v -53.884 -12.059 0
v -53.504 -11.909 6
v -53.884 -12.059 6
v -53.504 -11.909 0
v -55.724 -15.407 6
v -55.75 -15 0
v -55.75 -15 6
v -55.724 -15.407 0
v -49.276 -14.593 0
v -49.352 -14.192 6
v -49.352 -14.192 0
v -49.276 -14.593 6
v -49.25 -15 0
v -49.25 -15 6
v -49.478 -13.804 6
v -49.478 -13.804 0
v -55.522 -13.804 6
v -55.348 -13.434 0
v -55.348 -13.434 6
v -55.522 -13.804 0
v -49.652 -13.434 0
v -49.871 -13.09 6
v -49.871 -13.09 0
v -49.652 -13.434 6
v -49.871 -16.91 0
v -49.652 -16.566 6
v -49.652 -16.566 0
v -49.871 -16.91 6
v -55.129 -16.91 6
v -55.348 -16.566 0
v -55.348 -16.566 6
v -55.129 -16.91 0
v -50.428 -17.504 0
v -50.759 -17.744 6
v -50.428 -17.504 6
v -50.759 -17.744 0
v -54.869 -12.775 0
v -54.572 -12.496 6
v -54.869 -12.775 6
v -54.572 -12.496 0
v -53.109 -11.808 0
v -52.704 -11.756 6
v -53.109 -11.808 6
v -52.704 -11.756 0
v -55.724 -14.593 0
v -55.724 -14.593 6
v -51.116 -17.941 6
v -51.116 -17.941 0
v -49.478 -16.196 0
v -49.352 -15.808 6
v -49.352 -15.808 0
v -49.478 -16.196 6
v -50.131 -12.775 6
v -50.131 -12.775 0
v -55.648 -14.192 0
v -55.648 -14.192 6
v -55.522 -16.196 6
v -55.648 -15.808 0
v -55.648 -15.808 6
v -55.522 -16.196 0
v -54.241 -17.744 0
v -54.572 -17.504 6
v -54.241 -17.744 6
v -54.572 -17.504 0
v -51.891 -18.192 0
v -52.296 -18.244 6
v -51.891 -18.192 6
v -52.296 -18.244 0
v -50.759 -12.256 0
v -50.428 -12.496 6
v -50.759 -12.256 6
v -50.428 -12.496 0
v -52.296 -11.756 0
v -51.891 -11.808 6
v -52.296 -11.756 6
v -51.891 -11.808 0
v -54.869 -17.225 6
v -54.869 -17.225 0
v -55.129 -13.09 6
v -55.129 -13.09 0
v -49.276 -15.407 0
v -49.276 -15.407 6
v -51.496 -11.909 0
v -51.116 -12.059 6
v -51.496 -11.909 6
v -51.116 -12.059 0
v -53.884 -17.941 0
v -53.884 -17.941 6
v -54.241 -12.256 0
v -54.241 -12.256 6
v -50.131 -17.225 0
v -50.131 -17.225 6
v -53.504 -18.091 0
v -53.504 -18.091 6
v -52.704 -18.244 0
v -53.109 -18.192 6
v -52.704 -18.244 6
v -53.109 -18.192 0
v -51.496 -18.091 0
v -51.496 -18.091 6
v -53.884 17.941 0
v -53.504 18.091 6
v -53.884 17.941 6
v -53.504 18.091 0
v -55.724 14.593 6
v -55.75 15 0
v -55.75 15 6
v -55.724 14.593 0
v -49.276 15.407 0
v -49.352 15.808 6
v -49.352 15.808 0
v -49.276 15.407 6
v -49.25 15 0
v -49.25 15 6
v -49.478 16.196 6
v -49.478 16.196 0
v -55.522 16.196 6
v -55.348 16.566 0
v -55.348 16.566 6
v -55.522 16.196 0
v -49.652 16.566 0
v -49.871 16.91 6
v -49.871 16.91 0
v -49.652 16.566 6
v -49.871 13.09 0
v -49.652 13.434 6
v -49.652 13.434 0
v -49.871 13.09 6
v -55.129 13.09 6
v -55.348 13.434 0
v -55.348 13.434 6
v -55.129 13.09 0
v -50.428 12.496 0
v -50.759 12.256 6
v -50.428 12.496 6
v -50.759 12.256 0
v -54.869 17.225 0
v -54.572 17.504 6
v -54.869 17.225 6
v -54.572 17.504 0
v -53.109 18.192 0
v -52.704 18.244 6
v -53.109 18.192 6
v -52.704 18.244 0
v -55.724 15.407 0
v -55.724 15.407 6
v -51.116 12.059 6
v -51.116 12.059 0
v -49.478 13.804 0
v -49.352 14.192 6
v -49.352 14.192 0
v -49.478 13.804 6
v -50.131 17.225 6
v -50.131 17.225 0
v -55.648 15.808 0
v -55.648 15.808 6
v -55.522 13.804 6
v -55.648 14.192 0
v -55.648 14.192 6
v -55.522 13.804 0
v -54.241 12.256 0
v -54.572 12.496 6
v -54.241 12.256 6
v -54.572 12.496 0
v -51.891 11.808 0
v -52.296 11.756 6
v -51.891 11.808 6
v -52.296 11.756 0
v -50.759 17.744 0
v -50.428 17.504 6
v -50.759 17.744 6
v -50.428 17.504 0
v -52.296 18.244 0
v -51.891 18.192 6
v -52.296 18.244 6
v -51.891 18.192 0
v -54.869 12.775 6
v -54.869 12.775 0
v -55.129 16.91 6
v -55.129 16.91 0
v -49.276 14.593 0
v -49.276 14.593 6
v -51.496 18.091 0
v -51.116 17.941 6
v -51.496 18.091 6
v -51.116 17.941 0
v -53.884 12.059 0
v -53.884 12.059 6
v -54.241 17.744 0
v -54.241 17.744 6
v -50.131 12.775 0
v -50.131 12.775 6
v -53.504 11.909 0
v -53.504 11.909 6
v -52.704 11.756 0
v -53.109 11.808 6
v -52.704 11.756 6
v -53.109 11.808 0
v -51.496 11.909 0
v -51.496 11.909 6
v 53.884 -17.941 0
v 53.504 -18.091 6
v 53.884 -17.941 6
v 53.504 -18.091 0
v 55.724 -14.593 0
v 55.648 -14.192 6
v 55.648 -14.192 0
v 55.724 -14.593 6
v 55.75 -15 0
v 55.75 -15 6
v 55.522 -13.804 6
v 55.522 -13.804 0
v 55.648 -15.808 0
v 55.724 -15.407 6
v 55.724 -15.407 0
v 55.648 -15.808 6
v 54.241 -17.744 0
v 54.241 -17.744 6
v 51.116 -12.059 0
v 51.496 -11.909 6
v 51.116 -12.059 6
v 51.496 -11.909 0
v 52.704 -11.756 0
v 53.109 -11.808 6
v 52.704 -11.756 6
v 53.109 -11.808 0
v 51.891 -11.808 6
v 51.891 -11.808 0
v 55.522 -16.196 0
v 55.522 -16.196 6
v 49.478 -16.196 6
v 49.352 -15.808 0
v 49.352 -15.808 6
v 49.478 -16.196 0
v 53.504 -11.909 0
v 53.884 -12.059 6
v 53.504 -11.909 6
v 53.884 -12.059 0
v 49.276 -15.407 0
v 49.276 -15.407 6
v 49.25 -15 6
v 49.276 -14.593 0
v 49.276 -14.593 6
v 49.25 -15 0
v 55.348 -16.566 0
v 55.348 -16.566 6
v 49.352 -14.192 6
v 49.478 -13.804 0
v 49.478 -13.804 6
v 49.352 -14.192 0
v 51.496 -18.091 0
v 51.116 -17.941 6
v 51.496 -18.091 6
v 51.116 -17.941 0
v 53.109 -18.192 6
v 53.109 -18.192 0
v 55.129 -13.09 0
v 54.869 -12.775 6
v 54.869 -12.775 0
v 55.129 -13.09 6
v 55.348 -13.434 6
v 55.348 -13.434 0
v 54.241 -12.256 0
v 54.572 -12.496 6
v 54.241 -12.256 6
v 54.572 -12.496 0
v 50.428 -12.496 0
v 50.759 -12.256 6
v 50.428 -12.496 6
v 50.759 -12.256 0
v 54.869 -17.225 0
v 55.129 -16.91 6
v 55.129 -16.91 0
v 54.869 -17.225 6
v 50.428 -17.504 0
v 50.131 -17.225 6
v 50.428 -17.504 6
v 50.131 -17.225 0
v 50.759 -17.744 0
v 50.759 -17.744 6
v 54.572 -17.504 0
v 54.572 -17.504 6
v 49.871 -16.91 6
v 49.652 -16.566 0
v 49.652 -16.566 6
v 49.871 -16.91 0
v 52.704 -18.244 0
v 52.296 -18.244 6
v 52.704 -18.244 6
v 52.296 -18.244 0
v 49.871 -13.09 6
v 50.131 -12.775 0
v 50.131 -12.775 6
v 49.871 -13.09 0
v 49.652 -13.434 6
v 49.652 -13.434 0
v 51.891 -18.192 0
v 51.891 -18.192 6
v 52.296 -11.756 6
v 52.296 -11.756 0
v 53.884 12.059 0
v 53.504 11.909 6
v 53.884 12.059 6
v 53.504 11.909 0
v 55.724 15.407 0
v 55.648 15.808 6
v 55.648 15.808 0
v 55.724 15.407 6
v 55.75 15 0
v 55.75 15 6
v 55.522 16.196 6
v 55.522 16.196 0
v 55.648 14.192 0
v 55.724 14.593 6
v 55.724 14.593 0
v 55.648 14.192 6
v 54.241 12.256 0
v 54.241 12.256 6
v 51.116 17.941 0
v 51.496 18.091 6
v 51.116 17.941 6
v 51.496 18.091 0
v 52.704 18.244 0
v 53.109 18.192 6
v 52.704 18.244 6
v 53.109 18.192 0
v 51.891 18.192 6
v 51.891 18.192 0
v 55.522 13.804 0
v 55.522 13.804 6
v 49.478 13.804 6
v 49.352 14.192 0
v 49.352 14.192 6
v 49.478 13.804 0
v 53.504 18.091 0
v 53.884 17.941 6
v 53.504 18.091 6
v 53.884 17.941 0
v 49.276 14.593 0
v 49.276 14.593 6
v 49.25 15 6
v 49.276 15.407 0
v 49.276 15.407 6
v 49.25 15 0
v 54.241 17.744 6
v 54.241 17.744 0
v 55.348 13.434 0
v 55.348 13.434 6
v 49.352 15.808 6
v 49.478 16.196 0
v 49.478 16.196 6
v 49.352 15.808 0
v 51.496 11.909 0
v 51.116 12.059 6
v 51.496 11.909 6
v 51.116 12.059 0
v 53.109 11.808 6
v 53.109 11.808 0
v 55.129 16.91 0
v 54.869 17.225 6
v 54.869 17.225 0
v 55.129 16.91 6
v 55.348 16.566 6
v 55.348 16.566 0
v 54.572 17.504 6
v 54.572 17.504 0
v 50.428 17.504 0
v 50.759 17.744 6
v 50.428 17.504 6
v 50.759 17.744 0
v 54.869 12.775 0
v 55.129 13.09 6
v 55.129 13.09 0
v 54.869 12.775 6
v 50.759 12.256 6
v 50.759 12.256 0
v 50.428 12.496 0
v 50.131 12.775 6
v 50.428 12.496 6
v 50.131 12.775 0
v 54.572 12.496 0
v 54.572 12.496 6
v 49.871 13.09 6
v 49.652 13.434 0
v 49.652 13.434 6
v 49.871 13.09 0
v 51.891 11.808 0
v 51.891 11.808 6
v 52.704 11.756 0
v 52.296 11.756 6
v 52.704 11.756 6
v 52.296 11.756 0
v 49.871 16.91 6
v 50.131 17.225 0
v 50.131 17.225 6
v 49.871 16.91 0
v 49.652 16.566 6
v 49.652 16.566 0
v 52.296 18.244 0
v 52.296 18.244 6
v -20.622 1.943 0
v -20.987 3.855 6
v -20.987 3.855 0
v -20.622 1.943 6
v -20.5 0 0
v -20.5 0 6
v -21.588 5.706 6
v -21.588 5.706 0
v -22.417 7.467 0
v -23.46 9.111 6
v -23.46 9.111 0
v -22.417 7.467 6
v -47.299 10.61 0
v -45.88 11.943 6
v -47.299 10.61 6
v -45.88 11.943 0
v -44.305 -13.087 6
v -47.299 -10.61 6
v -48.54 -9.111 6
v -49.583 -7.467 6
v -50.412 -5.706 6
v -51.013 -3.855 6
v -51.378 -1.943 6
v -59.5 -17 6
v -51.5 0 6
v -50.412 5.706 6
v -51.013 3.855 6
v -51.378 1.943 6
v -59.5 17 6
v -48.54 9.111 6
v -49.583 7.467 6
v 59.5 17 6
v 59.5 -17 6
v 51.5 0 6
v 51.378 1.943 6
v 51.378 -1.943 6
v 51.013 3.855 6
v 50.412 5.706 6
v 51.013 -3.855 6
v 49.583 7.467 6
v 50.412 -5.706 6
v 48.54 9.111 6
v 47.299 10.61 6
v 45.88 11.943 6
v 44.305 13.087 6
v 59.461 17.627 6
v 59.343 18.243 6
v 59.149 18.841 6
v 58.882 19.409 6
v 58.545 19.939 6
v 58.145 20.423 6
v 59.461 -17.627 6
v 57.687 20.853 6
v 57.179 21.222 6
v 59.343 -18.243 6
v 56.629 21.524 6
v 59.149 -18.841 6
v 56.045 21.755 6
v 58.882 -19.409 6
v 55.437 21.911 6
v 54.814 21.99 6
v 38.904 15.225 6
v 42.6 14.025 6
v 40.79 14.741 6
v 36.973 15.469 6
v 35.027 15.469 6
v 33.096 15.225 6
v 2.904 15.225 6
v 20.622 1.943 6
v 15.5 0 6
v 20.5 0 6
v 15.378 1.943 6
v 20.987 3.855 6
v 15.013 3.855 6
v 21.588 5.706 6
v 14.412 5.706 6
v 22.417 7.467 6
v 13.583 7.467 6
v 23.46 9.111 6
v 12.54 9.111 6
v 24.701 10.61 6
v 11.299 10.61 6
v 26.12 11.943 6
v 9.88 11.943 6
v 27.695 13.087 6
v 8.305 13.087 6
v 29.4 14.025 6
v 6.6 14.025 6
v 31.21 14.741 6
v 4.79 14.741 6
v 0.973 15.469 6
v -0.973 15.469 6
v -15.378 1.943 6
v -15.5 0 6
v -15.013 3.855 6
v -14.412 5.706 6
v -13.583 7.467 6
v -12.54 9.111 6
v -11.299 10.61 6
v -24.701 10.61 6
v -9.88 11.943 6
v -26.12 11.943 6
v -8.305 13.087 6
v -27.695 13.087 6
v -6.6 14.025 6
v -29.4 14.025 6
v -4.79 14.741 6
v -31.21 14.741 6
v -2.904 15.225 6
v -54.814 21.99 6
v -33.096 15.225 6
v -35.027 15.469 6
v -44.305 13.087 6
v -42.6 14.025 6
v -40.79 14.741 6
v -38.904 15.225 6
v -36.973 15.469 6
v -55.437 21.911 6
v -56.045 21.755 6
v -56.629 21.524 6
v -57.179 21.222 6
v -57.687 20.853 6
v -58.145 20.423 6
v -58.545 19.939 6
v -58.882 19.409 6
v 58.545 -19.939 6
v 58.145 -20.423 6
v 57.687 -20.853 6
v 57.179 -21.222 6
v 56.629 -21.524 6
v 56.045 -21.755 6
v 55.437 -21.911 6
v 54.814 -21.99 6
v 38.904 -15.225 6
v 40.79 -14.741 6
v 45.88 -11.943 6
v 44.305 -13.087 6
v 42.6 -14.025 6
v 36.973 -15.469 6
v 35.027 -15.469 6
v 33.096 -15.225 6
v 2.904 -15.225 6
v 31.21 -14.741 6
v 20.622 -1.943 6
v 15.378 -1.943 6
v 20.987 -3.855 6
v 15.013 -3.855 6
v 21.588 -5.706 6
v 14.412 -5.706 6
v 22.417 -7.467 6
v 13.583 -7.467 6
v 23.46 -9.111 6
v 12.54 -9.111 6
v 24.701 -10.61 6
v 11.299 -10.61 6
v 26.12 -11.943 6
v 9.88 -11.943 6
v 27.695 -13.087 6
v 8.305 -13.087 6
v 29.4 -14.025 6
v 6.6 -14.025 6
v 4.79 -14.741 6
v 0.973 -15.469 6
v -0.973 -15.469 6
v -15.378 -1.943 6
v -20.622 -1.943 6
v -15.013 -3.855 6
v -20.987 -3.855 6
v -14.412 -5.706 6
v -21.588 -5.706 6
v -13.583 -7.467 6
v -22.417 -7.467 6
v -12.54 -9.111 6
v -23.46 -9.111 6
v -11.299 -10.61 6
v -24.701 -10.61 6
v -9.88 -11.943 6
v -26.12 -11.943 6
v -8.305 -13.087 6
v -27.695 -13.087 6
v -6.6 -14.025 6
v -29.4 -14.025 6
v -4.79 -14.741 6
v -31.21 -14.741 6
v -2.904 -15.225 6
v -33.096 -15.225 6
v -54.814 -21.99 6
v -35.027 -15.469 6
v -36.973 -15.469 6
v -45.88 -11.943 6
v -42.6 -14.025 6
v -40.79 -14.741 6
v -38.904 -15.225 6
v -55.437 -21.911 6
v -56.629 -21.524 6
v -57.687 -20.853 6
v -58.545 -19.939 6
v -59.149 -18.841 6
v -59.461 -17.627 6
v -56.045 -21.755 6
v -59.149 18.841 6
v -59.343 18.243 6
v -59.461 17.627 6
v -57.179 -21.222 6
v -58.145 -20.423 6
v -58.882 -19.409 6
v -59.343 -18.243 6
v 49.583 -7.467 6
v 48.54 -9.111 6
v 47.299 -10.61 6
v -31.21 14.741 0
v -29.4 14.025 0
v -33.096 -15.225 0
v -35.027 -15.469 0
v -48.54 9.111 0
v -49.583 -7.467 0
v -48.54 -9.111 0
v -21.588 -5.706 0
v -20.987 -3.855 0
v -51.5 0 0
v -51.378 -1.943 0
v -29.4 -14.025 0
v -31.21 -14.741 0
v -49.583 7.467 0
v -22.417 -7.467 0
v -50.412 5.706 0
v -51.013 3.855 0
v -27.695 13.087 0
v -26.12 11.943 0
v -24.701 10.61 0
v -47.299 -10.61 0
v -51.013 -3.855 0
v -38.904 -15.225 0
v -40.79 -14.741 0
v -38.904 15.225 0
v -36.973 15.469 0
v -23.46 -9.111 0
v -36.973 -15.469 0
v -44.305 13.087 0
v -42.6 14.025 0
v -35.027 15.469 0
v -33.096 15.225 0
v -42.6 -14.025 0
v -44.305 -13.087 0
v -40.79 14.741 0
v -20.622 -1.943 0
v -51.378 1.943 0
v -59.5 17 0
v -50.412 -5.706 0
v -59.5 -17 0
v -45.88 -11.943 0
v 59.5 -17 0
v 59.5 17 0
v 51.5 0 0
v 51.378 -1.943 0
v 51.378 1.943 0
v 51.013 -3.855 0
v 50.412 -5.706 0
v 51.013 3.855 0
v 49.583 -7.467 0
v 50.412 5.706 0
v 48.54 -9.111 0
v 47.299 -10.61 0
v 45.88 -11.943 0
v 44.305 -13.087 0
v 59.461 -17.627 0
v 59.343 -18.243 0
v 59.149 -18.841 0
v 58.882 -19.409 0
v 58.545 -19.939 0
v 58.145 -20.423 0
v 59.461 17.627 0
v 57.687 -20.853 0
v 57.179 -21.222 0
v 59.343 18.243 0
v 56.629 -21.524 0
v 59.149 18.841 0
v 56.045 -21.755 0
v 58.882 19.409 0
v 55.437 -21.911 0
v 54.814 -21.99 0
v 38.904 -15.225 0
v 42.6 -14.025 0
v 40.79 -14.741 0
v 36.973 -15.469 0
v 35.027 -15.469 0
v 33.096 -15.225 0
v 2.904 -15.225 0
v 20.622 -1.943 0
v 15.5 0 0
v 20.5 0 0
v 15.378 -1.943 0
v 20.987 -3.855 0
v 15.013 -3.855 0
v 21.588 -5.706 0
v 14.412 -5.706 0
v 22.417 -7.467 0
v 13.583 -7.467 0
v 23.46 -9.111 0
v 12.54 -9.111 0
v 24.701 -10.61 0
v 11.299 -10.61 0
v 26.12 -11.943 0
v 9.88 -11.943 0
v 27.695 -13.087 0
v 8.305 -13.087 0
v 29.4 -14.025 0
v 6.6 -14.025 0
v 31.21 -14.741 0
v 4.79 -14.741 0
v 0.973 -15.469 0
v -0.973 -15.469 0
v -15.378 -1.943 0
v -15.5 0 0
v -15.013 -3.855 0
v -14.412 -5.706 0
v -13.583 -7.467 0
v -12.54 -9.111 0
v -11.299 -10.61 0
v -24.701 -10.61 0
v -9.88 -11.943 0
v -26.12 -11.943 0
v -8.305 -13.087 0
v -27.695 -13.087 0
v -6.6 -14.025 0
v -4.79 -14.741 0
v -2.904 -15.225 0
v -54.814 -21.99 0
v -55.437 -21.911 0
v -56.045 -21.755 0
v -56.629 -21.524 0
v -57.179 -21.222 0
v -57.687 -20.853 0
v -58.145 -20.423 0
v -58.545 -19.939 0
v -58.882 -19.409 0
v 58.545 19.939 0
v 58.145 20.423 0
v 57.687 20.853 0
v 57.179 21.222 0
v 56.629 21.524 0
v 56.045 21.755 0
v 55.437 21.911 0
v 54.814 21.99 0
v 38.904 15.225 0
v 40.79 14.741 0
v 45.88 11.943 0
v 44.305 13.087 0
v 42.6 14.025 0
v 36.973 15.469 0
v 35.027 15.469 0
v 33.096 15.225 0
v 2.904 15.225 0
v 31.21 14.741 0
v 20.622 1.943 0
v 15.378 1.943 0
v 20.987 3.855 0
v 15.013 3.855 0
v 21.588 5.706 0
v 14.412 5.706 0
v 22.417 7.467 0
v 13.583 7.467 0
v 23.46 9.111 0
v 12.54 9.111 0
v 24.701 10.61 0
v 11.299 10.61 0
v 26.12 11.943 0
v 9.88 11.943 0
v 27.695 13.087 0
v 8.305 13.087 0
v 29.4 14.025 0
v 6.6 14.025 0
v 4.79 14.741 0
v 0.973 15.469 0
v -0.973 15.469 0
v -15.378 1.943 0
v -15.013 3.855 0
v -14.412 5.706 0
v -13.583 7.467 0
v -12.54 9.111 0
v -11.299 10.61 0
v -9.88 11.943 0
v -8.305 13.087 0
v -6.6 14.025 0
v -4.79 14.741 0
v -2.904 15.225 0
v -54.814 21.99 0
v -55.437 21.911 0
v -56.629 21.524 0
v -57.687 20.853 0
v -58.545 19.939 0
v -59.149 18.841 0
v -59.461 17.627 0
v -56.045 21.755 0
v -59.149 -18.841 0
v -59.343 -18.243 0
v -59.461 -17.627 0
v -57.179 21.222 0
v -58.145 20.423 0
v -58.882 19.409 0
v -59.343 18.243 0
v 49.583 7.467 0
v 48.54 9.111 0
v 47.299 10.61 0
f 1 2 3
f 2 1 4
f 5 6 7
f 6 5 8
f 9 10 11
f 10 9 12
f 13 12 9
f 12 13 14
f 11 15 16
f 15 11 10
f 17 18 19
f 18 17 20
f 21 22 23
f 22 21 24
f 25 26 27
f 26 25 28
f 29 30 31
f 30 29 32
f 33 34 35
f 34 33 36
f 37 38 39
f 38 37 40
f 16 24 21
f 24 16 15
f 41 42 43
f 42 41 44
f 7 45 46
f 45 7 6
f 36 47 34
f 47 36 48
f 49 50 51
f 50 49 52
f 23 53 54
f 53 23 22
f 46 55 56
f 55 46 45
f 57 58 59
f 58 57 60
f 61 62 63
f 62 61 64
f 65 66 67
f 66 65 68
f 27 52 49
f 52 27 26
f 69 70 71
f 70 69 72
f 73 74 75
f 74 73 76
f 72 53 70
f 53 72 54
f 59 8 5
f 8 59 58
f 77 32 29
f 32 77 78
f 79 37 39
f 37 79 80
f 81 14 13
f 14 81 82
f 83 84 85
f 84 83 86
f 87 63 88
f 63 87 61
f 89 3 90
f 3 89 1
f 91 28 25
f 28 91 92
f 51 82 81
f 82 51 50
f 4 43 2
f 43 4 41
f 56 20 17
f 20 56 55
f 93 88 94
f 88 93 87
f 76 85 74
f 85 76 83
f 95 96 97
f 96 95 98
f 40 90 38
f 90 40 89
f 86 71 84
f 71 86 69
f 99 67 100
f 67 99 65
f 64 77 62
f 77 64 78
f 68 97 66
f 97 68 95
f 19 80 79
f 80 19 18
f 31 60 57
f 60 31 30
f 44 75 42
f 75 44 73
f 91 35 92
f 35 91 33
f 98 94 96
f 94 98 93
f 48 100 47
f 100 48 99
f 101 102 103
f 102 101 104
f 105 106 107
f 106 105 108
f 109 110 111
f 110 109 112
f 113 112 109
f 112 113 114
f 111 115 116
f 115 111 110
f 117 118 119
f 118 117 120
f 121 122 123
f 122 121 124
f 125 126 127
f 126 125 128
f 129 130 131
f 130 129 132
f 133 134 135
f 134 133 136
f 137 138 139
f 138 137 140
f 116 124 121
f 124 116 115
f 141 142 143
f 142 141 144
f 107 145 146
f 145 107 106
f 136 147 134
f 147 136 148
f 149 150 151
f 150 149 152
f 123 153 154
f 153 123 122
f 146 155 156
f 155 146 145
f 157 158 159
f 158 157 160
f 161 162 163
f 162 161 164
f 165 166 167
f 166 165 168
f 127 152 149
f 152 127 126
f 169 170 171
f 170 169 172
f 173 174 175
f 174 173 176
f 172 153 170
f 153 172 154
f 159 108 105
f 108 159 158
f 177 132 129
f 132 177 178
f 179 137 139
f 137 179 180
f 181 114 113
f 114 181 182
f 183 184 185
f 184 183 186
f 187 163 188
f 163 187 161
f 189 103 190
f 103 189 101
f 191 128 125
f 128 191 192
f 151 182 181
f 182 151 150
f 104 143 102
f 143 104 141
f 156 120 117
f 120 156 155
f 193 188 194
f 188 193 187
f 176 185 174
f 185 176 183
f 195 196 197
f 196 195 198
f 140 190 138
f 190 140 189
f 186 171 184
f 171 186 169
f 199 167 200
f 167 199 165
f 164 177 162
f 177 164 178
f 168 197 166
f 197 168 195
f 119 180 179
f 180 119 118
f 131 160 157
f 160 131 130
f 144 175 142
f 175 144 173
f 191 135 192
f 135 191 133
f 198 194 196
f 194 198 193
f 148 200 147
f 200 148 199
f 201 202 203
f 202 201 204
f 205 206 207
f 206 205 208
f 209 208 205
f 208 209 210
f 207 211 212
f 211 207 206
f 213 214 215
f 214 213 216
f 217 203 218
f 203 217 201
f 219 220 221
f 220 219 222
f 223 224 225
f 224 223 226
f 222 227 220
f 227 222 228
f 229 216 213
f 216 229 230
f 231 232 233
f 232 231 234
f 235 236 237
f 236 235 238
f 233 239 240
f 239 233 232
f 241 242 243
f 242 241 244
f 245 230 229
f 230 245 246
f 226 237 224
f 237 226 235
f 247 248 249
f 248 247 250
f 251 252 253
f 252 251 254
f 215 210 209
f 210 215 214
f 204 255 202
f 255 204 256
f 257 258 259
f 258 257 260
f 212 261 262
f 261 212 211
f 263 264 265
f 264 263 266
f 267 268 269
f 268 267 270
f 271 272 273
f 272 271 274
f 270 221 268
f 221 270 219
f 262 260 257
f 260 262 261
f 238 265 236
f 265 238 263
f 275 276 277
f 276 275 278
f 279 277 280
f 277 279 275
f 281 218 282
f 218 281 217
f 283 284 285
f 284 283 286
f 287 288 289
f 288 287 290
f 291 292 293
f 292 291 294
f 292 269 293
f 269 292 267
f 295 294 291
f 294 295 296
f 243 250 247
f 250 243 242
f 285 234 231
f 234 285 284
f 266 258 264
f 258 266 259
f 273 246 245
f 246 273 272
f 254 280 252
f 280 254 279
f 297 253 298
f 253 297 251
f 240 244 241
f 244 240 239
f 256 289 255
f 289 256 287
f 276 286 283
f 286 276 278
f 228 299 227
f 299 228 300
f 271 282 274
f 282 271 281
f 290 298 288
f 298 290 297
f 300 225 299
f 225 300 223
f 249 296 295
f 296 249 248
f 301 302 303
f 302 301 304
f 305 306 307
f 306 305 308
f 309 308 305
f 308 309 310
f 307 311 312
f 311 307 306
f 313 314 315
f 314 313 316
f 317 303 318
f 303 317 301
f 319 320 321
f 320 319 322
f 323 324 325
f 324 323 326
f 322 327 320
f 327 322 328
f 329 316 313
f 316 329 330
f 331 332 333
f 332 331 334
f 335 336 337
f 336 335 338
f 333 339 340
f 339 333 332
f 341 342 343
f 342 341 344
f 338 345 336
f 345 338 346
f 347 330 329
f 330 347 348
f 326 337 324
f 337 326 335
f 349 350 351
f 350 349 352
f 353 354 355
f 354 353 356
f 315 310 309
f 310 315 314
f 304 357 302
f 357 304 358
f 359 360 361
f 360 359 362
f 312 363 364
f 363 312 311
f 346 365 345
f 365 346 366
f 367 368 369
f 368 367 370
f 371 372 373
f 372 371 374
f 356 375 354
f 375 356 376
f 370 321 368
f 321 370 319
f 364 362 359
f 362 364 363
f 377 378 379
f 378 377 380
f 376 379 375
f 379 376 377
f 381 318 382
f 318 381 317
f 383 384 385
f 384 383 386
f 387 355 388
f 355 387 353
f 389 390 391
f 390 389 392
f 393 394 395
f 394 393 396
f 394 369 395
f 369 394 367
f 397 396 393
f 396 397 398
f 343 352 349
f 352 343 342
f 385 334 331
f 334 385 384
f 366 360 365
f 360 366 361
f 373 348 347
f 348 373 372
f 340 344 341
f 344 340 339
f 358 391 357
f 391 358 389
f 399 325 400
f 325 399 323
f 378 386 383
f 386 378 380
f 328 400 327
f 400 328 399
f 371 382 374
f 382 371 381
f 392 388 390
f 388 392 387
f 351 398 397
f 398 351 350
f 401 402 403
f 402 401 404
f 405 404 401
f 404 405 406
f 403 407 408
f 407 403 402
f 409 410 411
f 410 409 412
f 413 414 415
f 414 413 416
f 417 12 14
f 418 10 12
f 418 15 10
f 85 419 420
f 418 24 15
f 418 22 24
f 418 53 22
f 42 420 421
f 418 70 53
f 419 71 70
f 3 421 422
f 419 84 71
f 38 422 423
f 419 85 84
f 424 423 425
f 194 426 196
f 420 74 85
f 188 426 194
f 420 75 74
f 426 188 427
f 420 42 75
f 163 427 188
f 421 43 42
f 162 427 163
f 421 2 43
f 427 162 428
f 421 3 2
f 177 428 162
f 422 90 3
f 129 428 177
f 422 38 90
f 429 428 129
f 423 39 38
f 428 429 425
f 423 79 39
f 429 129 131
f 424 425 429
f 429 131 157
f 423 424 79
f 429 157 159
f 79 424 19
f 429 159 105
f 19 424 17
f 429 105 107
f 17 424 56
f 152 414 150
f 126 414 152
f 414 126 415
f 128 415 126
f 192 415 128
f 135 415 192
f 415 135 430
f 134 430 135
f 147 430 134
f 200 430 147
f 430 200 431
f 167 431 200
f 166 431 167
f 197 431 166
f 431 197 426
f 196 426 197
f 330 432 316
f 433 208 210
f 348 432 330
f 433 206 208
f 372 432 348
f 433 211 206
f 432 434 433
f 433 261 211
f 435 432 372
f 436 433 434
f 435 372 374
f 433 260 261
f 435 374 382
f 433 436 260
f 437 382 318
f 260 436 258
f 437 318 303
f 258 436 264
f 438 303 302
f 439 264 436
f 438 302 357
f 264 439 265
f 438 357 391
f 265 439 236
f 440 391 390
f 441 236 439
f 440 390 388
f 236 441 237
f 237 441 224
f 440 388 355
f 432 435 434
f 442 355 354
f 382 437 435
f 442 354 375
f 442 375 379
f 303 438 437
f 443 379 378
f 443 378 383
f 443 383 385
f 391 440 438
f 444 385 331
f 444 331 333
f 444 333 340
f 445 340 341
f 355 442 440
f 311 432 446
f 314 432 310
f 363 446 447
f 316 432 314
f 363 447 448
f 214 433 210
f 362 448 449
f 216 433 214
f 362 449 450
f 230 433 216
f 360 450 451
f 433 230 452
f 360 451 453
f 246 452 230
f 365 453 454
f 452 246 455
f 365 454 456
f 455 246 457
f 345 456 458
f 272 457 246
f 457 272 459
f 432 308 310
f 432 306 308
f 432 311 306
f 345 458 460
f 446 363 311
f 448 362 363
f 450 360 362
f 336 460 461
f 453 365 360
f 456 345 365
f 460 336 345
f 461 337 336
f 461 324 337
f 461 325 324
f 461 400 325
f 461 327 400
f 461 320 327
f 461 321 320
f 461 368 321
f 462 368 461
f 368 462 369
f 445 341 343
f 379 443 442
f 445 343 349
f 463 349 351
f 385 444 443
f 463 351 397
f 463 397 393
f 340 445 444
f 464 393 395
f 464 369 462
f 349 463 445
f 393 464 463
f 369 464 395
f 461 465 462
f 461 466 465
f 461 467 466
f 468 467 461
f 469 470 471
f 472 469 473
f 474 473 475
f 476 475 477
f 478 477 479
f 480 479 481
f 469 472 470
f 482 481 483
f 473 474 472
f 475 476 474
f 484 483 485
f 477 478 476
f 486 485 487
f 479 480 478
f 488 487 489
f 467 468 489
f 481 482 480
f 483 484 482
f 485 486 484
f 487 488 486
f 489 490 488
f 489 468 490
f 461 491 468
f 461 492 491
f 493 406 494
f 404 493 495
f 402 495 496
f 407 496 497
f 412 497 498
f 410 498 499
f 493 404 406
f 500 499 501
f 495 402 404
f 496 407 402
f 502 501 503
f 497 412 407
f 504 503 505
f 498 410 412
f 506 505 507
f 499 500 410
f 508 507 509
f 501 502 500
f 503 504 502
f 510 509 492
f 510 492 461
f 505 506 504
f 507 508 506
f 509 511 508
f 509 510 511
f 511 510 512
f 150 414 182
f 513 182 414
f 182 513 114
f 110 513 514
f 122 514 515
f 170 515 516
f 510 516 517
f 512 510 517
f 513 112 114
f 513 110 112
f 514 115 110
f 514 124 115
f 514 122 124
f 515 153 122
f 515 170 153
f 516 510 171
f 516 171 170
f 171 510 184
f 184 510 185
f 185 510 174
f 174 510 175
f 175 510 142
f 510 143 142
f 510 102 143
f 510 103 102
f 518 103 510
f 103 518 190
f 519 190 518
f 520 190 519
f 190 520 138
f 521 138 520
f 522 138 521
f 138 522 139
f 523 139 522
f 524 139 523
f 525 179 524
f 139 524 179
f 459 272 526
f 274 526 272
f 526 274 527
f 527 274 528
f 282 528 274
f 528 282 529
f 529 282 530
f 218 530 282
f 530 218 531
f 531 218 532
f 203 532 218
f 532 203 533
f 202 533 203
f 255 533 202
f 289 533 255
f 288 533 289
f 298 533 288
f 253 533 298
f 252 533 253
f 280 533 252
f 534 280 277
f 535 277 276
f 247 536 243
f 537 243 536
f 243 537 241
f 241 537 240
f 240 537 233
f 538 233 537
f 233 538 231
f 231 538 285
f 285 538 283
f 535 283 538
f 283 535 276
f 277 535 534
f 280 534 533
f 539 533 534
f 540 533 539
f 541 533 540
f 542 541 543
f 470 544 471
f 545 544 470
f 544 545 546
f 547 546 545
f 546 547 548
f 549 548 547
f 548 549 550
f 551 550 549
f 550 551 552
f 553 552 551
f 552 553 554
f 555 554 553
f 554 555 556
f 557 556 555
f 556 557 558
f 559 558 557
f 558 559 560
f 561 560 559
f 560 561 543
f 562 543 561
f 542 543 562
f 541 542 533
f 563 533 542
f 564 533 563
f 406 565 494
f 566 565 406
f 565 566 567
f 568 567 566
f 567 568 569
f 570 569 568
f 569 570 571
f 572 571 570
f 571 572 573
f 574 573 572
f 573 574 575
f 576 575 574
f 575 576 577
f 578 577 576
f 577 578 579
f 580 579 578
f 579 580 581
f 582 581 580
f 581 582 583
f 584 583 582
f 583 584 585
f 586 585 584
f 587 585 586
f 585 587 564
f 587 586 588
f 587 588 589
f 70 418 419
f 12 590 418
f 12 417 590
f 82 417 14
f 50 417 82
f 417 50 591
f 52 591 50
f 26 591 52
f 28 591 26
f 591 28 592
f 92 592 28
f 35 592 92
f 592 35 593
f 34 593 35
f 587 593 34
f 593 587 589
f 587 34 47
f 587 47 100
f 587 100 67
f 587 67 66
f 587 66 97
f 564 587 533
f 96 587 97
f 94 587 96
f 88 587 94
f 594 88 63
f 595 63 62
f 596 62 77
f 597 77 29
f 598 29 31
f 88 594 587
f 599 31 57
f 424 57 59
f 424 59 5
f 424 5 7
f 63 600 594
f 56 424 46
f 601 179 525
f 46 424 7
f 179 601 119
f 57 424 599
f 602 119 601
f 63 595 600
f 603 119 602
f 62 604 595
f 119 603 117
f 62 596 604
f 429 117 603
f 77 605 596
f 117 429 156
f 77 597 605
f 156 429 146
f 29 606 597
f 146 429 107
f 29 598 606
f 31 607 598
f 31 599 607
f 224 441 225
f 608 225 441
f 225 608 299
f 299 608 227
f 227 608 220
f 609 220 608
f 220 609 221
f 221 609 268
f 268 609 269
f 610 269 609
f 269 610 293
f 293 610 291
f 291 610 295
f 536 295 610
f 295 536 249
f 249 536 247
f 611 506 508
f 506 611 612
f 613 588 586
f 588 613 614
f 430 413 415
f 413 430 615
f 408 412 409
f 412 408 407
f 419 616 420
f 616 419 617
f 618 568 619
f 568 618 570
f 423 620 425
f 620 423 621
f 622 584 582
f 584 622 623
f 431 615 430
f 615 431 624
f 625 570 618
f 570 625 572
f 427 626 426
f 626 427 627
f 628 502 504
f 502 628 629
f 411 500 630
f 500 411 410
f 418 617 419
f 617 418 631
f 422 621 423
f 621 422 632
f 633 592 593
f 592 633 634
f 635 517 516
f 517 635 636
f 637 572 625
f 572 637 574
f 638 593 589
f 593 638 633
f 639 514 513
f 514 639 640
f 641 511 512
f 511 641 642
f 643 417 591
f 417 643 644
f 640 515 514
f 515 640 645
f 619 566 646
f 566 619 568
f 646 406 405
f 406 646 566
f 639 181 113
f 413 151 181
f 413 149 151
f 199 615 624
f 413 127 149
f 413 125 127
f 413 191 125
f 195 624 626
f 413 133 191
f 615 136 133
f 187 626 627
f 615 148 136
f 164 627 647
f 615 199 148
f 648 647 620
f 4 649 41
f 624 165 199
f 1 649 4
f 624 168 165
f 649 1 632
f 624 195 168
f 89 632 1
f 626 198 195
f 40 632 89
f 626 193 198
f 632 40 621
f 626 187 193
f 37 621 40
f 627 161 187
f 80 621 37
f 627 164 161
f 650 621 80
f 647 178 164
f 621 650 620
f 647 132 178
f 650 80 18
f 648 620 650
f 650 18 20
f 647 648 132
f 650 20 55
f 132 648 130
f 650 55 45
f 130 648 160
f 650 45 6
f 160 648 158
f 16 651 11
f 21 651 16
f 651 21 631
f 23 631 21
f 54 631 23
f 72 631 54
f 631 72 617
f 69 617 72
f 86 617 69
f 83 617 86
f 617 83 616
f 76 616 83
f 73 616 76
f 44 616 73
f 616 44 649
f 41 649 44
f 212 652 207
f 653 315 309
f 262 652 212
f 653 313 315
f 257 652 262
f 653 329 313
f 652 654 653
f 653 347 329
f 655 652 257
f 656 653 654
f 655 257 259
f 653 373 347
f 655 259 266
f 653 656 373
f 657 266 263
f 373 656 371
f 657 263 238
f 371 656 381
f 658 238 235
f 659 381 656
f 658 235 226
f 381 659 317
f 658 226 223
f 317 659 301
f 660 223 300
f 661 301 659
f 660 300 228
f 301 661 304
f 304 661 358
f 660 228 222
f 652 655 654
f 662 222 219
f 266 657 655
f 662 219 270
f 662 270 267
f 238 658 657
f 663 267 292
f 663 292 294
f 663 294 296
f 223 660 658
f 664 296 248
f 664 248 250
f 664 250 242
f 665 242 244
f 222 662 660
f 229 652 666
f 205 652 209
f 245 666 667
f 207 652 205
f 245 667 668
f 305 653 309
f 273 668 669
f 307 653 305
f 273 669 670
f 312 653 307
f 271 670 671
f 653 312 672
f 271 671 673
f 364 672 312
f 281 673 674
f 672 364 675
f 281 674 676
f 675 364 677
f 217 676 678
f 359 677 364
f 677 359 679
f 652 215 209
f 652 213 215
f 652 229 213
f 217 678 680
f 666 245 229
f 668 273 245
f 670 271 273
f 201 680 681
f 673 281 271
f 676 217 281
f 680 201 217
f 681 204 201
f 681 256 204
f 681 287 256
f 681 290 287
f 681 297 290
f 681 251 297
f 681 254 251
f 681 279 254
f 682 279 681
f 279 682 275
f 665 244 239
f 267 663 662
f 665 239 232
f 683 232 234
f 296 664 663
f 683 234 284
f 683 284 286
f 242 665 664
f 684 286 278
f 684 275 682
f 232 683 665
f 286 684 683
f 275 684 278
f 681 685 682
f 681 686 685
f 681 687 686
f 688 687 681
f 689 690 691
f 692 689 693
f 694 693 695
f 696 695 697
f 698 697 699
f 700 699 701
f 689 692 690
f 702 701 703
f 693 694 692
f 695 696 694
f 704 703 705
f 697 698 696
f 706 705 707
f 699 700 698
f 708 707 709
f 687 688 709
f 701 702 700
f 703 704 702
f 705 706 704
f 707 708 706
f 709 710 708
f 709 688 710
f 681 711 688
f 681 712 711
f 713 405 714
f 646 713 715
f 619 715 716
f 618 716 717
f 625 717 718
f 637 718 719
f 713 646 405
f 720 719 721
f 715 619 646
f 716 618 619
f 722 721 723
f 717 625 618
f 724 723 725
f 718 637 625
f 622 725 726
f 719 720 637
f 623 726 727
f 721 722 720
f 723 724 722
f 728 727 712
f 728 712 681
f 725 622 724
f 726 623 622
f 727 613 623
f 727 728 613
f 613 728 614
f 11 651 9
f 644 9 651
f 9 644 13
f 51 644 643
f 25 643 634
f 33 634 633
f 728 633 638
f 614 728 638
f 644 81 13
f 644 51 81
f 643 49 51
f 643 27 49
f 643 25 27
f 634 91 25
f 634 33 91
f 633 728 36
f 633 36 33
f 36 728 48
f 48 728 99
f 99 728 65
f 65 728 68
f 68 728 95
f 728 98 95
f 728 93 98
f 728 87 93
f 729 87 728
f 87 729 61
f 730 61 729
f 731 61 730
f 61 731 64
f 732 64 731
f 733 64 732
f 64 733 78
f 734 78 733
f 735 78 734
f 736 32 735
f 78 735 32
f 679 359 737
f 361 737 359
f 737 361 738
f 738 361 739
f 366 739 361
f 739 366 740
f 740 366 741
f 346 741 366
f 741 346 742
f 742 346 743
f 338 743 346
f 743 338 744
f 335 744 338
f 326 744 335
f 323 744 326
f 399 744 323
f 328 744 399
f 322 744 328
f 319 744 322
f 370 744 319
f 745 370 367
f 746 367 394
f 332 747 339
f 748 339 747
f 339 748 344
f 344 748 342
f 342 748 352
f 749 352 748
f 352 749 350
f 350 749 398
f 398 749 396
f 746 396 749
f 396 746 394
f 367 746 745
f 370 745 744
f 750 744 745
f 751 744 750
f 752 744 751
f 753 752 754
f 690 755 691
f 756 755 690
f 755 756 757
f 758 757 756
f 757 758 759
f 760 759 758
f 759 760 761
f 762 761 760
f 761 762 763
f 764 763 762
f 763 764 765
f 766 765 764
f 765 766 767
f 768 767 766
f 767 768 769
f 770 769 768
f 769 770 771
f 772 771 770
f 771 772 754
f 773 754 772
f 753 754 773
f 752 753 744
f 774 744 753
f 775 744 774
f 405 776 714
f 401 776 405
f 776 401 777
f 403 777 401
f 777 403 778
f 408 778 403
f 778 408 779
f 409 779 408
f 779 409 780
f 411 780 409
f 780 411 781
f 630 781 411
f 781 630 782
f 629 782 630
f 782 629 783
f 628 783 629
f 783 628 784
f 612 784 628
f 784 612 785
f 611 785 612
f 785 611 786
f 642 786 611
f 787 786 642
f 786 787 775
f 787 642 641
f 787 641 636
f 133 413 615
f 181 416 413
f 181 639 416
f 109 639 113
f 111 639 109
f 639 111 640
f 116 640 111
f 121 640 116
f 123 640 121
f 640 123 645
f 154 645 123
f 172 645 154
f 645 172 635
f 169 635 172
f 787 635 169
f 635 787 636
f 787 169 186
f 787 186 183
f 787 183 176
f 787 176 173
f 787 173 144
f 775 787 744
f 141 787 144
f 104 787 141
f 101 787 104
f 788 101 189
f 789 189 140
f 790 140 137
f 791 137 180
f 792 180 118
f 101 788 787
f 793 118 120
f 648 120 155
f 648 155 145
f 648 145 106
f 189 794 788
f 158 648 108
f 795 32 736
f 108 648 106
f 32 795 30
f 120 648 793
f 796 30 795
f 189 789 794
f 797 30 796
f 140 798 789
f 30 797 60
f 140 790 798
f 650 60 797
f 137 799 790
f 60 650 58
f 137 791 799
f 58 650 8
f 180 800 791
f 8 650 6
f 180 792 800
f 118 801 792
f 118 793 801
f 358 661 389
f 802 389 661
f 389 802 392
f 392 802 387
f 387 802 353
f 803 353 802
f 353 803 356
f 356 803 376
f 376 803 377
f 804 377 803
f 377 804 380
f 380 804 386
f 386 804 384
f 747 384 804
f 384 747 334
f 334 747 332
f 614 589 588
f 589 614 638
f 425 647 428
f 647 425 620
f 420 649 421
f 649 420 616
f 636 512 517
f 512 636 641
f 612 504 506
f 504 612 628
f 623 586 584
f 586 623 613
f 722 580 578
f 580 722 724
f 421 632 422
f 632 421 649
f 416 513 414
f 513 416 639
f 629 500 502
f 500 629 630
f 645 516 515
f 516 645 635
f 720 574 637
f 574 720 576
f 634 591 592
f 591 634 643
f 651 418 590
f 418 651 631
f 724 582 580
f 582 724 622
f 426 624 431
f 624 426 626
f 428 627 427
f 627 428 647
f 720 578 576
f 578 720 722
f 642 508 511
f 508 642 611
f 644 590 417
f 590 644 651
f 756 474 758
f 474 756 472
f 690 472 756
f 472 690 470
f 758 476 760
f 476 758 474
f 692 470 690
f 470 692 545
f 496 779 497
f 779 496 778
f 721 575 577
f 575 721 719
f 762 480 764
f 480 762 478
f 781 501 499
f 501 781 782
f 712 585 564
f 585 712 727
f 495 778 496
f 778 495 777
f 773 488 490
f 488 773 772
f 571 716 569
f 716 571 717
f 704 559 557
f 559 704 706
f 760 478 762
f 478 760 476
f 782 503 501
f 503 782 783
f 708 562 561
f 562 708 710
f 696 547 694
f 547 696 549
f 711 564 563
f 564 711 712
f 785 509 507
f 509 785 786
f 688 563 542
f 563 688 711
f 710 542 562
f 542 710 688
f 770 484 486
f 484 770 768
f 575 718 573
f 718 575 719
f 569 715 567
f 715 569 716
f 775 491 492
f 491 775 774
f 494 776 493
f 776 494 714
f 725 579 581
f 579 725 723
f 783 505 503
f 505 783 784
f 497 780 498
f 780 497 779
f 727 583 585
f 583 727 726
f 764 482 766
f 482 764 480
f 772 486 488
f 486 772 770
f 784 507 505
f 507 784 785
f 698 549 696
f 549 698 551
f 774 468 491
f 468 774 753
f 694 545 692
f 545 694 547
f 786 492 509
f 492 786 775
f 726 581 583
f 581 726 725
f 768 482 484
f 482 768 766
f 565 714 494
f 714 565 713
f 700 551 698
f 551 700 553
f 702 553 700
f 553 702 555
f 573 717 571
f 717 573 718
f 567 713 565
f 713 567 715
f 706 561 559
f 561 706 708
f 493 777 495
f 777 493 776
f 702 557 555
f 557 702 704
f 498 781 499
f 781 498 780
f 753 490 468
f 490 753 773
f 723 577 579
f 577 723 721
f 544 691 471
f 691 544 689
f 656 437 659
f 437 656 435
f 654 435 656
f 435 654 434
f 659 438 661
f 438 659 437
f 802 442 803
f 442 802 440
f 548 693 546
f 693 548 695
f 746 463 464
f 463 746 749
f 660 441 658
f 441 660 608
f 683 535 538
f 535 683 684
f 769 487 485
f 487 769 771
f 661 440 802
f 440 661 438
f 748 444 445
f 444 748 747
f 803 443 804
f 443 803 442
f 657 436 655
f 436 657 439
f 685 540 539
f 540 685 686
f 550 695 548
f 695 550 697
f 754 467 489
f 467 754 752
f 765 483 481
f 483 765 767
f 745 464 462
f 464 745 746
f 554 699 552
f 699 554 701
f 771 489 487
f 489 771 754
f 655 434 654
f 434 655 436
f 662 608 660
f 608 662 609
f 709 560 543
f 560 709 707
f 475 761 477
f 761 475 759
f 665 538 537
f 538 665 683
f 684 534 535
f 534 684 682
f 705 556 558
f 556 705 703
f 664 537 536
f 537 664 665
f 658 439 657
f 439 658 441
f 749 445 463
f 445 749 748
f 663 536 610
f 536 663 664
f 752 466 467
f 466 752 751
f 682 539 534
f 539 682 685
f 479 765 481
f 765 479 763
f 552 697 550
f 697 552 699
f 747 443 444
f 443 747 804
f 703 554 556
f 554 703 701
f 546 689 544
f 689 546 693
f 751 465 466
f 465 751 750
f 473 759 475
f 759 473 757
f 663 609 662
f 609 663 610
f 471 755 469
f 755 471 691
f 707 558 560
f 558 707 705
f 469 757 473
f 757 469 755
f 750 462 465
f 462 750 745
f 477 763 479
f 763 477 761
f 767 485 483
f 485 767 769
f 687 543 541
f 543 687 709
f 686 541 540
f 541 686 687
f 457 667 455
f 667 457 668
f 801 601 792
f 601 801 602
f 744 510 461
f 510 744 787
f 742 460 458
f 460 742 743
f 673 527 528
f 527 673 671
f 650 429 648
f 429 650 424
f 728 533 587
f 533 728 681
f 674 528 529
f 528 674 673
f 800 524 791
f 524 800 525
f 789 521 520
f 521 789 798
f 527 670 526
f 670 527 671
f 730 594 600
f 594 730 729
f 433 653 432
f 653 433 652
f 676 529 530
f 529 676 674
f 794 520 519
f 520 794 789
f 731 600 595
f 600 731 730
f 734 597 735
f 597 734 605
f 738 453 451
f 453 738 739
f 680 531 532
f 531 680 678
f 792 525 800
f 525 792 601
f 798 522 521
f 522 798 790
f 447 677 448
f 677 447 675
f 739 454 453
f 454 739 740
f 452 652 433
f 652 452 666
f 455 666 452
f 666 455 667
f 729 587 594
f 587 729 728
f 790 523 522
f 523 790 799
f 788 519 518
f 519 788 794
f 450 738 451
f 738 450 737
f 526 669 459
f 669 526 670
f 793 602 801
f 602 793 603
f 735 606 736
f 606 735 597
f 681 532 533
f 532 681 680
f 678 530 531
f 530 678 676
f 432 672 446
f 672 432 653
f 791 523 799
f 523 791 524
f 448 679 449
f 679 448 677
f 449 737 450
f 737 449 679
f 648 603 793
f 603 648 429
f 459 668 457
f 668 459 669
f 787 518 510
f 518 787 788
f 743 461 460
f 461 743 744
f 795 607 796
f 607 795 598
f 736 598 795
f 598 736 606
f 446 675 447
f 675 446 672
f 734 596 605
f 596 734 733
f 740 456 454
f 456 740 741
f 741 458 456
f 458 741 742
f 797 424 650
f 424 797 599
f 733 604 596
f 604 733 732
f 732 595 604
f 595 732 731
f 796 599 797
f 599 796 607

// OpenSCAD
$fn = 50;

difference() {
	union() {
		hull() {
			translate(v = [-54.5, 17.0, 0]) {
				cylinder(h = 6, r = 5);
			}
			translate(v = [54.5, 17.0, 0]) {
				cylinder(h = 6, r = 5);
			}
			translate(v = [-54.5, -17.0, 0]) {
				cylinder(h = 6, r = 5);
			}
			translate(v = [54.5, -17.0, 0]) {
				cylinder(h = 6, r = 5);
			}
		}
	}
	union() {
		translate(v = [-52.5, -15.0, -100.0]) {
			cylinder(h = 200, r = 3.25);
		}
		translate(v = [-52.5, 15.0, -100.0]) {
			cylinder(h = 200, r = 3.25);
		}
		translate(v = [52.5, -15.0, -100.0]) {
			cylinder(h = 200, r = 3.25);
		}
		translate(v = [52.5, 15.0, -100.0]) {
			cylinder(h = 200, r = 3.25);
		}
		translate(v = [-52.5, -15.0, -100.0]) {
			cylinder(h = 200, r = 1.8);
		}
		translate(v = [-52.5, 15.0, -100.0]) {
			cylinder(h = 200, r = 1.8);
		}
		translate(v = [52.5, -15.0, -100.0]) {
			cylinder(h = 200, r = 1.8);
		}
		translate(v = [52.5, 15.0, -100.0]) {
			cylinder(h = 200, r = 1.8);
		}
		translate(v = [-36.0, 0, 0.0]) {
			cylinder(h = 6, r = 15.5);
		}
		cylinder(h = 6, r = 15.5);
		translate(v = [36.0, 0, 0.0]) {
			cylinder(h = 6, r = 15.5);
		}
	}
}
